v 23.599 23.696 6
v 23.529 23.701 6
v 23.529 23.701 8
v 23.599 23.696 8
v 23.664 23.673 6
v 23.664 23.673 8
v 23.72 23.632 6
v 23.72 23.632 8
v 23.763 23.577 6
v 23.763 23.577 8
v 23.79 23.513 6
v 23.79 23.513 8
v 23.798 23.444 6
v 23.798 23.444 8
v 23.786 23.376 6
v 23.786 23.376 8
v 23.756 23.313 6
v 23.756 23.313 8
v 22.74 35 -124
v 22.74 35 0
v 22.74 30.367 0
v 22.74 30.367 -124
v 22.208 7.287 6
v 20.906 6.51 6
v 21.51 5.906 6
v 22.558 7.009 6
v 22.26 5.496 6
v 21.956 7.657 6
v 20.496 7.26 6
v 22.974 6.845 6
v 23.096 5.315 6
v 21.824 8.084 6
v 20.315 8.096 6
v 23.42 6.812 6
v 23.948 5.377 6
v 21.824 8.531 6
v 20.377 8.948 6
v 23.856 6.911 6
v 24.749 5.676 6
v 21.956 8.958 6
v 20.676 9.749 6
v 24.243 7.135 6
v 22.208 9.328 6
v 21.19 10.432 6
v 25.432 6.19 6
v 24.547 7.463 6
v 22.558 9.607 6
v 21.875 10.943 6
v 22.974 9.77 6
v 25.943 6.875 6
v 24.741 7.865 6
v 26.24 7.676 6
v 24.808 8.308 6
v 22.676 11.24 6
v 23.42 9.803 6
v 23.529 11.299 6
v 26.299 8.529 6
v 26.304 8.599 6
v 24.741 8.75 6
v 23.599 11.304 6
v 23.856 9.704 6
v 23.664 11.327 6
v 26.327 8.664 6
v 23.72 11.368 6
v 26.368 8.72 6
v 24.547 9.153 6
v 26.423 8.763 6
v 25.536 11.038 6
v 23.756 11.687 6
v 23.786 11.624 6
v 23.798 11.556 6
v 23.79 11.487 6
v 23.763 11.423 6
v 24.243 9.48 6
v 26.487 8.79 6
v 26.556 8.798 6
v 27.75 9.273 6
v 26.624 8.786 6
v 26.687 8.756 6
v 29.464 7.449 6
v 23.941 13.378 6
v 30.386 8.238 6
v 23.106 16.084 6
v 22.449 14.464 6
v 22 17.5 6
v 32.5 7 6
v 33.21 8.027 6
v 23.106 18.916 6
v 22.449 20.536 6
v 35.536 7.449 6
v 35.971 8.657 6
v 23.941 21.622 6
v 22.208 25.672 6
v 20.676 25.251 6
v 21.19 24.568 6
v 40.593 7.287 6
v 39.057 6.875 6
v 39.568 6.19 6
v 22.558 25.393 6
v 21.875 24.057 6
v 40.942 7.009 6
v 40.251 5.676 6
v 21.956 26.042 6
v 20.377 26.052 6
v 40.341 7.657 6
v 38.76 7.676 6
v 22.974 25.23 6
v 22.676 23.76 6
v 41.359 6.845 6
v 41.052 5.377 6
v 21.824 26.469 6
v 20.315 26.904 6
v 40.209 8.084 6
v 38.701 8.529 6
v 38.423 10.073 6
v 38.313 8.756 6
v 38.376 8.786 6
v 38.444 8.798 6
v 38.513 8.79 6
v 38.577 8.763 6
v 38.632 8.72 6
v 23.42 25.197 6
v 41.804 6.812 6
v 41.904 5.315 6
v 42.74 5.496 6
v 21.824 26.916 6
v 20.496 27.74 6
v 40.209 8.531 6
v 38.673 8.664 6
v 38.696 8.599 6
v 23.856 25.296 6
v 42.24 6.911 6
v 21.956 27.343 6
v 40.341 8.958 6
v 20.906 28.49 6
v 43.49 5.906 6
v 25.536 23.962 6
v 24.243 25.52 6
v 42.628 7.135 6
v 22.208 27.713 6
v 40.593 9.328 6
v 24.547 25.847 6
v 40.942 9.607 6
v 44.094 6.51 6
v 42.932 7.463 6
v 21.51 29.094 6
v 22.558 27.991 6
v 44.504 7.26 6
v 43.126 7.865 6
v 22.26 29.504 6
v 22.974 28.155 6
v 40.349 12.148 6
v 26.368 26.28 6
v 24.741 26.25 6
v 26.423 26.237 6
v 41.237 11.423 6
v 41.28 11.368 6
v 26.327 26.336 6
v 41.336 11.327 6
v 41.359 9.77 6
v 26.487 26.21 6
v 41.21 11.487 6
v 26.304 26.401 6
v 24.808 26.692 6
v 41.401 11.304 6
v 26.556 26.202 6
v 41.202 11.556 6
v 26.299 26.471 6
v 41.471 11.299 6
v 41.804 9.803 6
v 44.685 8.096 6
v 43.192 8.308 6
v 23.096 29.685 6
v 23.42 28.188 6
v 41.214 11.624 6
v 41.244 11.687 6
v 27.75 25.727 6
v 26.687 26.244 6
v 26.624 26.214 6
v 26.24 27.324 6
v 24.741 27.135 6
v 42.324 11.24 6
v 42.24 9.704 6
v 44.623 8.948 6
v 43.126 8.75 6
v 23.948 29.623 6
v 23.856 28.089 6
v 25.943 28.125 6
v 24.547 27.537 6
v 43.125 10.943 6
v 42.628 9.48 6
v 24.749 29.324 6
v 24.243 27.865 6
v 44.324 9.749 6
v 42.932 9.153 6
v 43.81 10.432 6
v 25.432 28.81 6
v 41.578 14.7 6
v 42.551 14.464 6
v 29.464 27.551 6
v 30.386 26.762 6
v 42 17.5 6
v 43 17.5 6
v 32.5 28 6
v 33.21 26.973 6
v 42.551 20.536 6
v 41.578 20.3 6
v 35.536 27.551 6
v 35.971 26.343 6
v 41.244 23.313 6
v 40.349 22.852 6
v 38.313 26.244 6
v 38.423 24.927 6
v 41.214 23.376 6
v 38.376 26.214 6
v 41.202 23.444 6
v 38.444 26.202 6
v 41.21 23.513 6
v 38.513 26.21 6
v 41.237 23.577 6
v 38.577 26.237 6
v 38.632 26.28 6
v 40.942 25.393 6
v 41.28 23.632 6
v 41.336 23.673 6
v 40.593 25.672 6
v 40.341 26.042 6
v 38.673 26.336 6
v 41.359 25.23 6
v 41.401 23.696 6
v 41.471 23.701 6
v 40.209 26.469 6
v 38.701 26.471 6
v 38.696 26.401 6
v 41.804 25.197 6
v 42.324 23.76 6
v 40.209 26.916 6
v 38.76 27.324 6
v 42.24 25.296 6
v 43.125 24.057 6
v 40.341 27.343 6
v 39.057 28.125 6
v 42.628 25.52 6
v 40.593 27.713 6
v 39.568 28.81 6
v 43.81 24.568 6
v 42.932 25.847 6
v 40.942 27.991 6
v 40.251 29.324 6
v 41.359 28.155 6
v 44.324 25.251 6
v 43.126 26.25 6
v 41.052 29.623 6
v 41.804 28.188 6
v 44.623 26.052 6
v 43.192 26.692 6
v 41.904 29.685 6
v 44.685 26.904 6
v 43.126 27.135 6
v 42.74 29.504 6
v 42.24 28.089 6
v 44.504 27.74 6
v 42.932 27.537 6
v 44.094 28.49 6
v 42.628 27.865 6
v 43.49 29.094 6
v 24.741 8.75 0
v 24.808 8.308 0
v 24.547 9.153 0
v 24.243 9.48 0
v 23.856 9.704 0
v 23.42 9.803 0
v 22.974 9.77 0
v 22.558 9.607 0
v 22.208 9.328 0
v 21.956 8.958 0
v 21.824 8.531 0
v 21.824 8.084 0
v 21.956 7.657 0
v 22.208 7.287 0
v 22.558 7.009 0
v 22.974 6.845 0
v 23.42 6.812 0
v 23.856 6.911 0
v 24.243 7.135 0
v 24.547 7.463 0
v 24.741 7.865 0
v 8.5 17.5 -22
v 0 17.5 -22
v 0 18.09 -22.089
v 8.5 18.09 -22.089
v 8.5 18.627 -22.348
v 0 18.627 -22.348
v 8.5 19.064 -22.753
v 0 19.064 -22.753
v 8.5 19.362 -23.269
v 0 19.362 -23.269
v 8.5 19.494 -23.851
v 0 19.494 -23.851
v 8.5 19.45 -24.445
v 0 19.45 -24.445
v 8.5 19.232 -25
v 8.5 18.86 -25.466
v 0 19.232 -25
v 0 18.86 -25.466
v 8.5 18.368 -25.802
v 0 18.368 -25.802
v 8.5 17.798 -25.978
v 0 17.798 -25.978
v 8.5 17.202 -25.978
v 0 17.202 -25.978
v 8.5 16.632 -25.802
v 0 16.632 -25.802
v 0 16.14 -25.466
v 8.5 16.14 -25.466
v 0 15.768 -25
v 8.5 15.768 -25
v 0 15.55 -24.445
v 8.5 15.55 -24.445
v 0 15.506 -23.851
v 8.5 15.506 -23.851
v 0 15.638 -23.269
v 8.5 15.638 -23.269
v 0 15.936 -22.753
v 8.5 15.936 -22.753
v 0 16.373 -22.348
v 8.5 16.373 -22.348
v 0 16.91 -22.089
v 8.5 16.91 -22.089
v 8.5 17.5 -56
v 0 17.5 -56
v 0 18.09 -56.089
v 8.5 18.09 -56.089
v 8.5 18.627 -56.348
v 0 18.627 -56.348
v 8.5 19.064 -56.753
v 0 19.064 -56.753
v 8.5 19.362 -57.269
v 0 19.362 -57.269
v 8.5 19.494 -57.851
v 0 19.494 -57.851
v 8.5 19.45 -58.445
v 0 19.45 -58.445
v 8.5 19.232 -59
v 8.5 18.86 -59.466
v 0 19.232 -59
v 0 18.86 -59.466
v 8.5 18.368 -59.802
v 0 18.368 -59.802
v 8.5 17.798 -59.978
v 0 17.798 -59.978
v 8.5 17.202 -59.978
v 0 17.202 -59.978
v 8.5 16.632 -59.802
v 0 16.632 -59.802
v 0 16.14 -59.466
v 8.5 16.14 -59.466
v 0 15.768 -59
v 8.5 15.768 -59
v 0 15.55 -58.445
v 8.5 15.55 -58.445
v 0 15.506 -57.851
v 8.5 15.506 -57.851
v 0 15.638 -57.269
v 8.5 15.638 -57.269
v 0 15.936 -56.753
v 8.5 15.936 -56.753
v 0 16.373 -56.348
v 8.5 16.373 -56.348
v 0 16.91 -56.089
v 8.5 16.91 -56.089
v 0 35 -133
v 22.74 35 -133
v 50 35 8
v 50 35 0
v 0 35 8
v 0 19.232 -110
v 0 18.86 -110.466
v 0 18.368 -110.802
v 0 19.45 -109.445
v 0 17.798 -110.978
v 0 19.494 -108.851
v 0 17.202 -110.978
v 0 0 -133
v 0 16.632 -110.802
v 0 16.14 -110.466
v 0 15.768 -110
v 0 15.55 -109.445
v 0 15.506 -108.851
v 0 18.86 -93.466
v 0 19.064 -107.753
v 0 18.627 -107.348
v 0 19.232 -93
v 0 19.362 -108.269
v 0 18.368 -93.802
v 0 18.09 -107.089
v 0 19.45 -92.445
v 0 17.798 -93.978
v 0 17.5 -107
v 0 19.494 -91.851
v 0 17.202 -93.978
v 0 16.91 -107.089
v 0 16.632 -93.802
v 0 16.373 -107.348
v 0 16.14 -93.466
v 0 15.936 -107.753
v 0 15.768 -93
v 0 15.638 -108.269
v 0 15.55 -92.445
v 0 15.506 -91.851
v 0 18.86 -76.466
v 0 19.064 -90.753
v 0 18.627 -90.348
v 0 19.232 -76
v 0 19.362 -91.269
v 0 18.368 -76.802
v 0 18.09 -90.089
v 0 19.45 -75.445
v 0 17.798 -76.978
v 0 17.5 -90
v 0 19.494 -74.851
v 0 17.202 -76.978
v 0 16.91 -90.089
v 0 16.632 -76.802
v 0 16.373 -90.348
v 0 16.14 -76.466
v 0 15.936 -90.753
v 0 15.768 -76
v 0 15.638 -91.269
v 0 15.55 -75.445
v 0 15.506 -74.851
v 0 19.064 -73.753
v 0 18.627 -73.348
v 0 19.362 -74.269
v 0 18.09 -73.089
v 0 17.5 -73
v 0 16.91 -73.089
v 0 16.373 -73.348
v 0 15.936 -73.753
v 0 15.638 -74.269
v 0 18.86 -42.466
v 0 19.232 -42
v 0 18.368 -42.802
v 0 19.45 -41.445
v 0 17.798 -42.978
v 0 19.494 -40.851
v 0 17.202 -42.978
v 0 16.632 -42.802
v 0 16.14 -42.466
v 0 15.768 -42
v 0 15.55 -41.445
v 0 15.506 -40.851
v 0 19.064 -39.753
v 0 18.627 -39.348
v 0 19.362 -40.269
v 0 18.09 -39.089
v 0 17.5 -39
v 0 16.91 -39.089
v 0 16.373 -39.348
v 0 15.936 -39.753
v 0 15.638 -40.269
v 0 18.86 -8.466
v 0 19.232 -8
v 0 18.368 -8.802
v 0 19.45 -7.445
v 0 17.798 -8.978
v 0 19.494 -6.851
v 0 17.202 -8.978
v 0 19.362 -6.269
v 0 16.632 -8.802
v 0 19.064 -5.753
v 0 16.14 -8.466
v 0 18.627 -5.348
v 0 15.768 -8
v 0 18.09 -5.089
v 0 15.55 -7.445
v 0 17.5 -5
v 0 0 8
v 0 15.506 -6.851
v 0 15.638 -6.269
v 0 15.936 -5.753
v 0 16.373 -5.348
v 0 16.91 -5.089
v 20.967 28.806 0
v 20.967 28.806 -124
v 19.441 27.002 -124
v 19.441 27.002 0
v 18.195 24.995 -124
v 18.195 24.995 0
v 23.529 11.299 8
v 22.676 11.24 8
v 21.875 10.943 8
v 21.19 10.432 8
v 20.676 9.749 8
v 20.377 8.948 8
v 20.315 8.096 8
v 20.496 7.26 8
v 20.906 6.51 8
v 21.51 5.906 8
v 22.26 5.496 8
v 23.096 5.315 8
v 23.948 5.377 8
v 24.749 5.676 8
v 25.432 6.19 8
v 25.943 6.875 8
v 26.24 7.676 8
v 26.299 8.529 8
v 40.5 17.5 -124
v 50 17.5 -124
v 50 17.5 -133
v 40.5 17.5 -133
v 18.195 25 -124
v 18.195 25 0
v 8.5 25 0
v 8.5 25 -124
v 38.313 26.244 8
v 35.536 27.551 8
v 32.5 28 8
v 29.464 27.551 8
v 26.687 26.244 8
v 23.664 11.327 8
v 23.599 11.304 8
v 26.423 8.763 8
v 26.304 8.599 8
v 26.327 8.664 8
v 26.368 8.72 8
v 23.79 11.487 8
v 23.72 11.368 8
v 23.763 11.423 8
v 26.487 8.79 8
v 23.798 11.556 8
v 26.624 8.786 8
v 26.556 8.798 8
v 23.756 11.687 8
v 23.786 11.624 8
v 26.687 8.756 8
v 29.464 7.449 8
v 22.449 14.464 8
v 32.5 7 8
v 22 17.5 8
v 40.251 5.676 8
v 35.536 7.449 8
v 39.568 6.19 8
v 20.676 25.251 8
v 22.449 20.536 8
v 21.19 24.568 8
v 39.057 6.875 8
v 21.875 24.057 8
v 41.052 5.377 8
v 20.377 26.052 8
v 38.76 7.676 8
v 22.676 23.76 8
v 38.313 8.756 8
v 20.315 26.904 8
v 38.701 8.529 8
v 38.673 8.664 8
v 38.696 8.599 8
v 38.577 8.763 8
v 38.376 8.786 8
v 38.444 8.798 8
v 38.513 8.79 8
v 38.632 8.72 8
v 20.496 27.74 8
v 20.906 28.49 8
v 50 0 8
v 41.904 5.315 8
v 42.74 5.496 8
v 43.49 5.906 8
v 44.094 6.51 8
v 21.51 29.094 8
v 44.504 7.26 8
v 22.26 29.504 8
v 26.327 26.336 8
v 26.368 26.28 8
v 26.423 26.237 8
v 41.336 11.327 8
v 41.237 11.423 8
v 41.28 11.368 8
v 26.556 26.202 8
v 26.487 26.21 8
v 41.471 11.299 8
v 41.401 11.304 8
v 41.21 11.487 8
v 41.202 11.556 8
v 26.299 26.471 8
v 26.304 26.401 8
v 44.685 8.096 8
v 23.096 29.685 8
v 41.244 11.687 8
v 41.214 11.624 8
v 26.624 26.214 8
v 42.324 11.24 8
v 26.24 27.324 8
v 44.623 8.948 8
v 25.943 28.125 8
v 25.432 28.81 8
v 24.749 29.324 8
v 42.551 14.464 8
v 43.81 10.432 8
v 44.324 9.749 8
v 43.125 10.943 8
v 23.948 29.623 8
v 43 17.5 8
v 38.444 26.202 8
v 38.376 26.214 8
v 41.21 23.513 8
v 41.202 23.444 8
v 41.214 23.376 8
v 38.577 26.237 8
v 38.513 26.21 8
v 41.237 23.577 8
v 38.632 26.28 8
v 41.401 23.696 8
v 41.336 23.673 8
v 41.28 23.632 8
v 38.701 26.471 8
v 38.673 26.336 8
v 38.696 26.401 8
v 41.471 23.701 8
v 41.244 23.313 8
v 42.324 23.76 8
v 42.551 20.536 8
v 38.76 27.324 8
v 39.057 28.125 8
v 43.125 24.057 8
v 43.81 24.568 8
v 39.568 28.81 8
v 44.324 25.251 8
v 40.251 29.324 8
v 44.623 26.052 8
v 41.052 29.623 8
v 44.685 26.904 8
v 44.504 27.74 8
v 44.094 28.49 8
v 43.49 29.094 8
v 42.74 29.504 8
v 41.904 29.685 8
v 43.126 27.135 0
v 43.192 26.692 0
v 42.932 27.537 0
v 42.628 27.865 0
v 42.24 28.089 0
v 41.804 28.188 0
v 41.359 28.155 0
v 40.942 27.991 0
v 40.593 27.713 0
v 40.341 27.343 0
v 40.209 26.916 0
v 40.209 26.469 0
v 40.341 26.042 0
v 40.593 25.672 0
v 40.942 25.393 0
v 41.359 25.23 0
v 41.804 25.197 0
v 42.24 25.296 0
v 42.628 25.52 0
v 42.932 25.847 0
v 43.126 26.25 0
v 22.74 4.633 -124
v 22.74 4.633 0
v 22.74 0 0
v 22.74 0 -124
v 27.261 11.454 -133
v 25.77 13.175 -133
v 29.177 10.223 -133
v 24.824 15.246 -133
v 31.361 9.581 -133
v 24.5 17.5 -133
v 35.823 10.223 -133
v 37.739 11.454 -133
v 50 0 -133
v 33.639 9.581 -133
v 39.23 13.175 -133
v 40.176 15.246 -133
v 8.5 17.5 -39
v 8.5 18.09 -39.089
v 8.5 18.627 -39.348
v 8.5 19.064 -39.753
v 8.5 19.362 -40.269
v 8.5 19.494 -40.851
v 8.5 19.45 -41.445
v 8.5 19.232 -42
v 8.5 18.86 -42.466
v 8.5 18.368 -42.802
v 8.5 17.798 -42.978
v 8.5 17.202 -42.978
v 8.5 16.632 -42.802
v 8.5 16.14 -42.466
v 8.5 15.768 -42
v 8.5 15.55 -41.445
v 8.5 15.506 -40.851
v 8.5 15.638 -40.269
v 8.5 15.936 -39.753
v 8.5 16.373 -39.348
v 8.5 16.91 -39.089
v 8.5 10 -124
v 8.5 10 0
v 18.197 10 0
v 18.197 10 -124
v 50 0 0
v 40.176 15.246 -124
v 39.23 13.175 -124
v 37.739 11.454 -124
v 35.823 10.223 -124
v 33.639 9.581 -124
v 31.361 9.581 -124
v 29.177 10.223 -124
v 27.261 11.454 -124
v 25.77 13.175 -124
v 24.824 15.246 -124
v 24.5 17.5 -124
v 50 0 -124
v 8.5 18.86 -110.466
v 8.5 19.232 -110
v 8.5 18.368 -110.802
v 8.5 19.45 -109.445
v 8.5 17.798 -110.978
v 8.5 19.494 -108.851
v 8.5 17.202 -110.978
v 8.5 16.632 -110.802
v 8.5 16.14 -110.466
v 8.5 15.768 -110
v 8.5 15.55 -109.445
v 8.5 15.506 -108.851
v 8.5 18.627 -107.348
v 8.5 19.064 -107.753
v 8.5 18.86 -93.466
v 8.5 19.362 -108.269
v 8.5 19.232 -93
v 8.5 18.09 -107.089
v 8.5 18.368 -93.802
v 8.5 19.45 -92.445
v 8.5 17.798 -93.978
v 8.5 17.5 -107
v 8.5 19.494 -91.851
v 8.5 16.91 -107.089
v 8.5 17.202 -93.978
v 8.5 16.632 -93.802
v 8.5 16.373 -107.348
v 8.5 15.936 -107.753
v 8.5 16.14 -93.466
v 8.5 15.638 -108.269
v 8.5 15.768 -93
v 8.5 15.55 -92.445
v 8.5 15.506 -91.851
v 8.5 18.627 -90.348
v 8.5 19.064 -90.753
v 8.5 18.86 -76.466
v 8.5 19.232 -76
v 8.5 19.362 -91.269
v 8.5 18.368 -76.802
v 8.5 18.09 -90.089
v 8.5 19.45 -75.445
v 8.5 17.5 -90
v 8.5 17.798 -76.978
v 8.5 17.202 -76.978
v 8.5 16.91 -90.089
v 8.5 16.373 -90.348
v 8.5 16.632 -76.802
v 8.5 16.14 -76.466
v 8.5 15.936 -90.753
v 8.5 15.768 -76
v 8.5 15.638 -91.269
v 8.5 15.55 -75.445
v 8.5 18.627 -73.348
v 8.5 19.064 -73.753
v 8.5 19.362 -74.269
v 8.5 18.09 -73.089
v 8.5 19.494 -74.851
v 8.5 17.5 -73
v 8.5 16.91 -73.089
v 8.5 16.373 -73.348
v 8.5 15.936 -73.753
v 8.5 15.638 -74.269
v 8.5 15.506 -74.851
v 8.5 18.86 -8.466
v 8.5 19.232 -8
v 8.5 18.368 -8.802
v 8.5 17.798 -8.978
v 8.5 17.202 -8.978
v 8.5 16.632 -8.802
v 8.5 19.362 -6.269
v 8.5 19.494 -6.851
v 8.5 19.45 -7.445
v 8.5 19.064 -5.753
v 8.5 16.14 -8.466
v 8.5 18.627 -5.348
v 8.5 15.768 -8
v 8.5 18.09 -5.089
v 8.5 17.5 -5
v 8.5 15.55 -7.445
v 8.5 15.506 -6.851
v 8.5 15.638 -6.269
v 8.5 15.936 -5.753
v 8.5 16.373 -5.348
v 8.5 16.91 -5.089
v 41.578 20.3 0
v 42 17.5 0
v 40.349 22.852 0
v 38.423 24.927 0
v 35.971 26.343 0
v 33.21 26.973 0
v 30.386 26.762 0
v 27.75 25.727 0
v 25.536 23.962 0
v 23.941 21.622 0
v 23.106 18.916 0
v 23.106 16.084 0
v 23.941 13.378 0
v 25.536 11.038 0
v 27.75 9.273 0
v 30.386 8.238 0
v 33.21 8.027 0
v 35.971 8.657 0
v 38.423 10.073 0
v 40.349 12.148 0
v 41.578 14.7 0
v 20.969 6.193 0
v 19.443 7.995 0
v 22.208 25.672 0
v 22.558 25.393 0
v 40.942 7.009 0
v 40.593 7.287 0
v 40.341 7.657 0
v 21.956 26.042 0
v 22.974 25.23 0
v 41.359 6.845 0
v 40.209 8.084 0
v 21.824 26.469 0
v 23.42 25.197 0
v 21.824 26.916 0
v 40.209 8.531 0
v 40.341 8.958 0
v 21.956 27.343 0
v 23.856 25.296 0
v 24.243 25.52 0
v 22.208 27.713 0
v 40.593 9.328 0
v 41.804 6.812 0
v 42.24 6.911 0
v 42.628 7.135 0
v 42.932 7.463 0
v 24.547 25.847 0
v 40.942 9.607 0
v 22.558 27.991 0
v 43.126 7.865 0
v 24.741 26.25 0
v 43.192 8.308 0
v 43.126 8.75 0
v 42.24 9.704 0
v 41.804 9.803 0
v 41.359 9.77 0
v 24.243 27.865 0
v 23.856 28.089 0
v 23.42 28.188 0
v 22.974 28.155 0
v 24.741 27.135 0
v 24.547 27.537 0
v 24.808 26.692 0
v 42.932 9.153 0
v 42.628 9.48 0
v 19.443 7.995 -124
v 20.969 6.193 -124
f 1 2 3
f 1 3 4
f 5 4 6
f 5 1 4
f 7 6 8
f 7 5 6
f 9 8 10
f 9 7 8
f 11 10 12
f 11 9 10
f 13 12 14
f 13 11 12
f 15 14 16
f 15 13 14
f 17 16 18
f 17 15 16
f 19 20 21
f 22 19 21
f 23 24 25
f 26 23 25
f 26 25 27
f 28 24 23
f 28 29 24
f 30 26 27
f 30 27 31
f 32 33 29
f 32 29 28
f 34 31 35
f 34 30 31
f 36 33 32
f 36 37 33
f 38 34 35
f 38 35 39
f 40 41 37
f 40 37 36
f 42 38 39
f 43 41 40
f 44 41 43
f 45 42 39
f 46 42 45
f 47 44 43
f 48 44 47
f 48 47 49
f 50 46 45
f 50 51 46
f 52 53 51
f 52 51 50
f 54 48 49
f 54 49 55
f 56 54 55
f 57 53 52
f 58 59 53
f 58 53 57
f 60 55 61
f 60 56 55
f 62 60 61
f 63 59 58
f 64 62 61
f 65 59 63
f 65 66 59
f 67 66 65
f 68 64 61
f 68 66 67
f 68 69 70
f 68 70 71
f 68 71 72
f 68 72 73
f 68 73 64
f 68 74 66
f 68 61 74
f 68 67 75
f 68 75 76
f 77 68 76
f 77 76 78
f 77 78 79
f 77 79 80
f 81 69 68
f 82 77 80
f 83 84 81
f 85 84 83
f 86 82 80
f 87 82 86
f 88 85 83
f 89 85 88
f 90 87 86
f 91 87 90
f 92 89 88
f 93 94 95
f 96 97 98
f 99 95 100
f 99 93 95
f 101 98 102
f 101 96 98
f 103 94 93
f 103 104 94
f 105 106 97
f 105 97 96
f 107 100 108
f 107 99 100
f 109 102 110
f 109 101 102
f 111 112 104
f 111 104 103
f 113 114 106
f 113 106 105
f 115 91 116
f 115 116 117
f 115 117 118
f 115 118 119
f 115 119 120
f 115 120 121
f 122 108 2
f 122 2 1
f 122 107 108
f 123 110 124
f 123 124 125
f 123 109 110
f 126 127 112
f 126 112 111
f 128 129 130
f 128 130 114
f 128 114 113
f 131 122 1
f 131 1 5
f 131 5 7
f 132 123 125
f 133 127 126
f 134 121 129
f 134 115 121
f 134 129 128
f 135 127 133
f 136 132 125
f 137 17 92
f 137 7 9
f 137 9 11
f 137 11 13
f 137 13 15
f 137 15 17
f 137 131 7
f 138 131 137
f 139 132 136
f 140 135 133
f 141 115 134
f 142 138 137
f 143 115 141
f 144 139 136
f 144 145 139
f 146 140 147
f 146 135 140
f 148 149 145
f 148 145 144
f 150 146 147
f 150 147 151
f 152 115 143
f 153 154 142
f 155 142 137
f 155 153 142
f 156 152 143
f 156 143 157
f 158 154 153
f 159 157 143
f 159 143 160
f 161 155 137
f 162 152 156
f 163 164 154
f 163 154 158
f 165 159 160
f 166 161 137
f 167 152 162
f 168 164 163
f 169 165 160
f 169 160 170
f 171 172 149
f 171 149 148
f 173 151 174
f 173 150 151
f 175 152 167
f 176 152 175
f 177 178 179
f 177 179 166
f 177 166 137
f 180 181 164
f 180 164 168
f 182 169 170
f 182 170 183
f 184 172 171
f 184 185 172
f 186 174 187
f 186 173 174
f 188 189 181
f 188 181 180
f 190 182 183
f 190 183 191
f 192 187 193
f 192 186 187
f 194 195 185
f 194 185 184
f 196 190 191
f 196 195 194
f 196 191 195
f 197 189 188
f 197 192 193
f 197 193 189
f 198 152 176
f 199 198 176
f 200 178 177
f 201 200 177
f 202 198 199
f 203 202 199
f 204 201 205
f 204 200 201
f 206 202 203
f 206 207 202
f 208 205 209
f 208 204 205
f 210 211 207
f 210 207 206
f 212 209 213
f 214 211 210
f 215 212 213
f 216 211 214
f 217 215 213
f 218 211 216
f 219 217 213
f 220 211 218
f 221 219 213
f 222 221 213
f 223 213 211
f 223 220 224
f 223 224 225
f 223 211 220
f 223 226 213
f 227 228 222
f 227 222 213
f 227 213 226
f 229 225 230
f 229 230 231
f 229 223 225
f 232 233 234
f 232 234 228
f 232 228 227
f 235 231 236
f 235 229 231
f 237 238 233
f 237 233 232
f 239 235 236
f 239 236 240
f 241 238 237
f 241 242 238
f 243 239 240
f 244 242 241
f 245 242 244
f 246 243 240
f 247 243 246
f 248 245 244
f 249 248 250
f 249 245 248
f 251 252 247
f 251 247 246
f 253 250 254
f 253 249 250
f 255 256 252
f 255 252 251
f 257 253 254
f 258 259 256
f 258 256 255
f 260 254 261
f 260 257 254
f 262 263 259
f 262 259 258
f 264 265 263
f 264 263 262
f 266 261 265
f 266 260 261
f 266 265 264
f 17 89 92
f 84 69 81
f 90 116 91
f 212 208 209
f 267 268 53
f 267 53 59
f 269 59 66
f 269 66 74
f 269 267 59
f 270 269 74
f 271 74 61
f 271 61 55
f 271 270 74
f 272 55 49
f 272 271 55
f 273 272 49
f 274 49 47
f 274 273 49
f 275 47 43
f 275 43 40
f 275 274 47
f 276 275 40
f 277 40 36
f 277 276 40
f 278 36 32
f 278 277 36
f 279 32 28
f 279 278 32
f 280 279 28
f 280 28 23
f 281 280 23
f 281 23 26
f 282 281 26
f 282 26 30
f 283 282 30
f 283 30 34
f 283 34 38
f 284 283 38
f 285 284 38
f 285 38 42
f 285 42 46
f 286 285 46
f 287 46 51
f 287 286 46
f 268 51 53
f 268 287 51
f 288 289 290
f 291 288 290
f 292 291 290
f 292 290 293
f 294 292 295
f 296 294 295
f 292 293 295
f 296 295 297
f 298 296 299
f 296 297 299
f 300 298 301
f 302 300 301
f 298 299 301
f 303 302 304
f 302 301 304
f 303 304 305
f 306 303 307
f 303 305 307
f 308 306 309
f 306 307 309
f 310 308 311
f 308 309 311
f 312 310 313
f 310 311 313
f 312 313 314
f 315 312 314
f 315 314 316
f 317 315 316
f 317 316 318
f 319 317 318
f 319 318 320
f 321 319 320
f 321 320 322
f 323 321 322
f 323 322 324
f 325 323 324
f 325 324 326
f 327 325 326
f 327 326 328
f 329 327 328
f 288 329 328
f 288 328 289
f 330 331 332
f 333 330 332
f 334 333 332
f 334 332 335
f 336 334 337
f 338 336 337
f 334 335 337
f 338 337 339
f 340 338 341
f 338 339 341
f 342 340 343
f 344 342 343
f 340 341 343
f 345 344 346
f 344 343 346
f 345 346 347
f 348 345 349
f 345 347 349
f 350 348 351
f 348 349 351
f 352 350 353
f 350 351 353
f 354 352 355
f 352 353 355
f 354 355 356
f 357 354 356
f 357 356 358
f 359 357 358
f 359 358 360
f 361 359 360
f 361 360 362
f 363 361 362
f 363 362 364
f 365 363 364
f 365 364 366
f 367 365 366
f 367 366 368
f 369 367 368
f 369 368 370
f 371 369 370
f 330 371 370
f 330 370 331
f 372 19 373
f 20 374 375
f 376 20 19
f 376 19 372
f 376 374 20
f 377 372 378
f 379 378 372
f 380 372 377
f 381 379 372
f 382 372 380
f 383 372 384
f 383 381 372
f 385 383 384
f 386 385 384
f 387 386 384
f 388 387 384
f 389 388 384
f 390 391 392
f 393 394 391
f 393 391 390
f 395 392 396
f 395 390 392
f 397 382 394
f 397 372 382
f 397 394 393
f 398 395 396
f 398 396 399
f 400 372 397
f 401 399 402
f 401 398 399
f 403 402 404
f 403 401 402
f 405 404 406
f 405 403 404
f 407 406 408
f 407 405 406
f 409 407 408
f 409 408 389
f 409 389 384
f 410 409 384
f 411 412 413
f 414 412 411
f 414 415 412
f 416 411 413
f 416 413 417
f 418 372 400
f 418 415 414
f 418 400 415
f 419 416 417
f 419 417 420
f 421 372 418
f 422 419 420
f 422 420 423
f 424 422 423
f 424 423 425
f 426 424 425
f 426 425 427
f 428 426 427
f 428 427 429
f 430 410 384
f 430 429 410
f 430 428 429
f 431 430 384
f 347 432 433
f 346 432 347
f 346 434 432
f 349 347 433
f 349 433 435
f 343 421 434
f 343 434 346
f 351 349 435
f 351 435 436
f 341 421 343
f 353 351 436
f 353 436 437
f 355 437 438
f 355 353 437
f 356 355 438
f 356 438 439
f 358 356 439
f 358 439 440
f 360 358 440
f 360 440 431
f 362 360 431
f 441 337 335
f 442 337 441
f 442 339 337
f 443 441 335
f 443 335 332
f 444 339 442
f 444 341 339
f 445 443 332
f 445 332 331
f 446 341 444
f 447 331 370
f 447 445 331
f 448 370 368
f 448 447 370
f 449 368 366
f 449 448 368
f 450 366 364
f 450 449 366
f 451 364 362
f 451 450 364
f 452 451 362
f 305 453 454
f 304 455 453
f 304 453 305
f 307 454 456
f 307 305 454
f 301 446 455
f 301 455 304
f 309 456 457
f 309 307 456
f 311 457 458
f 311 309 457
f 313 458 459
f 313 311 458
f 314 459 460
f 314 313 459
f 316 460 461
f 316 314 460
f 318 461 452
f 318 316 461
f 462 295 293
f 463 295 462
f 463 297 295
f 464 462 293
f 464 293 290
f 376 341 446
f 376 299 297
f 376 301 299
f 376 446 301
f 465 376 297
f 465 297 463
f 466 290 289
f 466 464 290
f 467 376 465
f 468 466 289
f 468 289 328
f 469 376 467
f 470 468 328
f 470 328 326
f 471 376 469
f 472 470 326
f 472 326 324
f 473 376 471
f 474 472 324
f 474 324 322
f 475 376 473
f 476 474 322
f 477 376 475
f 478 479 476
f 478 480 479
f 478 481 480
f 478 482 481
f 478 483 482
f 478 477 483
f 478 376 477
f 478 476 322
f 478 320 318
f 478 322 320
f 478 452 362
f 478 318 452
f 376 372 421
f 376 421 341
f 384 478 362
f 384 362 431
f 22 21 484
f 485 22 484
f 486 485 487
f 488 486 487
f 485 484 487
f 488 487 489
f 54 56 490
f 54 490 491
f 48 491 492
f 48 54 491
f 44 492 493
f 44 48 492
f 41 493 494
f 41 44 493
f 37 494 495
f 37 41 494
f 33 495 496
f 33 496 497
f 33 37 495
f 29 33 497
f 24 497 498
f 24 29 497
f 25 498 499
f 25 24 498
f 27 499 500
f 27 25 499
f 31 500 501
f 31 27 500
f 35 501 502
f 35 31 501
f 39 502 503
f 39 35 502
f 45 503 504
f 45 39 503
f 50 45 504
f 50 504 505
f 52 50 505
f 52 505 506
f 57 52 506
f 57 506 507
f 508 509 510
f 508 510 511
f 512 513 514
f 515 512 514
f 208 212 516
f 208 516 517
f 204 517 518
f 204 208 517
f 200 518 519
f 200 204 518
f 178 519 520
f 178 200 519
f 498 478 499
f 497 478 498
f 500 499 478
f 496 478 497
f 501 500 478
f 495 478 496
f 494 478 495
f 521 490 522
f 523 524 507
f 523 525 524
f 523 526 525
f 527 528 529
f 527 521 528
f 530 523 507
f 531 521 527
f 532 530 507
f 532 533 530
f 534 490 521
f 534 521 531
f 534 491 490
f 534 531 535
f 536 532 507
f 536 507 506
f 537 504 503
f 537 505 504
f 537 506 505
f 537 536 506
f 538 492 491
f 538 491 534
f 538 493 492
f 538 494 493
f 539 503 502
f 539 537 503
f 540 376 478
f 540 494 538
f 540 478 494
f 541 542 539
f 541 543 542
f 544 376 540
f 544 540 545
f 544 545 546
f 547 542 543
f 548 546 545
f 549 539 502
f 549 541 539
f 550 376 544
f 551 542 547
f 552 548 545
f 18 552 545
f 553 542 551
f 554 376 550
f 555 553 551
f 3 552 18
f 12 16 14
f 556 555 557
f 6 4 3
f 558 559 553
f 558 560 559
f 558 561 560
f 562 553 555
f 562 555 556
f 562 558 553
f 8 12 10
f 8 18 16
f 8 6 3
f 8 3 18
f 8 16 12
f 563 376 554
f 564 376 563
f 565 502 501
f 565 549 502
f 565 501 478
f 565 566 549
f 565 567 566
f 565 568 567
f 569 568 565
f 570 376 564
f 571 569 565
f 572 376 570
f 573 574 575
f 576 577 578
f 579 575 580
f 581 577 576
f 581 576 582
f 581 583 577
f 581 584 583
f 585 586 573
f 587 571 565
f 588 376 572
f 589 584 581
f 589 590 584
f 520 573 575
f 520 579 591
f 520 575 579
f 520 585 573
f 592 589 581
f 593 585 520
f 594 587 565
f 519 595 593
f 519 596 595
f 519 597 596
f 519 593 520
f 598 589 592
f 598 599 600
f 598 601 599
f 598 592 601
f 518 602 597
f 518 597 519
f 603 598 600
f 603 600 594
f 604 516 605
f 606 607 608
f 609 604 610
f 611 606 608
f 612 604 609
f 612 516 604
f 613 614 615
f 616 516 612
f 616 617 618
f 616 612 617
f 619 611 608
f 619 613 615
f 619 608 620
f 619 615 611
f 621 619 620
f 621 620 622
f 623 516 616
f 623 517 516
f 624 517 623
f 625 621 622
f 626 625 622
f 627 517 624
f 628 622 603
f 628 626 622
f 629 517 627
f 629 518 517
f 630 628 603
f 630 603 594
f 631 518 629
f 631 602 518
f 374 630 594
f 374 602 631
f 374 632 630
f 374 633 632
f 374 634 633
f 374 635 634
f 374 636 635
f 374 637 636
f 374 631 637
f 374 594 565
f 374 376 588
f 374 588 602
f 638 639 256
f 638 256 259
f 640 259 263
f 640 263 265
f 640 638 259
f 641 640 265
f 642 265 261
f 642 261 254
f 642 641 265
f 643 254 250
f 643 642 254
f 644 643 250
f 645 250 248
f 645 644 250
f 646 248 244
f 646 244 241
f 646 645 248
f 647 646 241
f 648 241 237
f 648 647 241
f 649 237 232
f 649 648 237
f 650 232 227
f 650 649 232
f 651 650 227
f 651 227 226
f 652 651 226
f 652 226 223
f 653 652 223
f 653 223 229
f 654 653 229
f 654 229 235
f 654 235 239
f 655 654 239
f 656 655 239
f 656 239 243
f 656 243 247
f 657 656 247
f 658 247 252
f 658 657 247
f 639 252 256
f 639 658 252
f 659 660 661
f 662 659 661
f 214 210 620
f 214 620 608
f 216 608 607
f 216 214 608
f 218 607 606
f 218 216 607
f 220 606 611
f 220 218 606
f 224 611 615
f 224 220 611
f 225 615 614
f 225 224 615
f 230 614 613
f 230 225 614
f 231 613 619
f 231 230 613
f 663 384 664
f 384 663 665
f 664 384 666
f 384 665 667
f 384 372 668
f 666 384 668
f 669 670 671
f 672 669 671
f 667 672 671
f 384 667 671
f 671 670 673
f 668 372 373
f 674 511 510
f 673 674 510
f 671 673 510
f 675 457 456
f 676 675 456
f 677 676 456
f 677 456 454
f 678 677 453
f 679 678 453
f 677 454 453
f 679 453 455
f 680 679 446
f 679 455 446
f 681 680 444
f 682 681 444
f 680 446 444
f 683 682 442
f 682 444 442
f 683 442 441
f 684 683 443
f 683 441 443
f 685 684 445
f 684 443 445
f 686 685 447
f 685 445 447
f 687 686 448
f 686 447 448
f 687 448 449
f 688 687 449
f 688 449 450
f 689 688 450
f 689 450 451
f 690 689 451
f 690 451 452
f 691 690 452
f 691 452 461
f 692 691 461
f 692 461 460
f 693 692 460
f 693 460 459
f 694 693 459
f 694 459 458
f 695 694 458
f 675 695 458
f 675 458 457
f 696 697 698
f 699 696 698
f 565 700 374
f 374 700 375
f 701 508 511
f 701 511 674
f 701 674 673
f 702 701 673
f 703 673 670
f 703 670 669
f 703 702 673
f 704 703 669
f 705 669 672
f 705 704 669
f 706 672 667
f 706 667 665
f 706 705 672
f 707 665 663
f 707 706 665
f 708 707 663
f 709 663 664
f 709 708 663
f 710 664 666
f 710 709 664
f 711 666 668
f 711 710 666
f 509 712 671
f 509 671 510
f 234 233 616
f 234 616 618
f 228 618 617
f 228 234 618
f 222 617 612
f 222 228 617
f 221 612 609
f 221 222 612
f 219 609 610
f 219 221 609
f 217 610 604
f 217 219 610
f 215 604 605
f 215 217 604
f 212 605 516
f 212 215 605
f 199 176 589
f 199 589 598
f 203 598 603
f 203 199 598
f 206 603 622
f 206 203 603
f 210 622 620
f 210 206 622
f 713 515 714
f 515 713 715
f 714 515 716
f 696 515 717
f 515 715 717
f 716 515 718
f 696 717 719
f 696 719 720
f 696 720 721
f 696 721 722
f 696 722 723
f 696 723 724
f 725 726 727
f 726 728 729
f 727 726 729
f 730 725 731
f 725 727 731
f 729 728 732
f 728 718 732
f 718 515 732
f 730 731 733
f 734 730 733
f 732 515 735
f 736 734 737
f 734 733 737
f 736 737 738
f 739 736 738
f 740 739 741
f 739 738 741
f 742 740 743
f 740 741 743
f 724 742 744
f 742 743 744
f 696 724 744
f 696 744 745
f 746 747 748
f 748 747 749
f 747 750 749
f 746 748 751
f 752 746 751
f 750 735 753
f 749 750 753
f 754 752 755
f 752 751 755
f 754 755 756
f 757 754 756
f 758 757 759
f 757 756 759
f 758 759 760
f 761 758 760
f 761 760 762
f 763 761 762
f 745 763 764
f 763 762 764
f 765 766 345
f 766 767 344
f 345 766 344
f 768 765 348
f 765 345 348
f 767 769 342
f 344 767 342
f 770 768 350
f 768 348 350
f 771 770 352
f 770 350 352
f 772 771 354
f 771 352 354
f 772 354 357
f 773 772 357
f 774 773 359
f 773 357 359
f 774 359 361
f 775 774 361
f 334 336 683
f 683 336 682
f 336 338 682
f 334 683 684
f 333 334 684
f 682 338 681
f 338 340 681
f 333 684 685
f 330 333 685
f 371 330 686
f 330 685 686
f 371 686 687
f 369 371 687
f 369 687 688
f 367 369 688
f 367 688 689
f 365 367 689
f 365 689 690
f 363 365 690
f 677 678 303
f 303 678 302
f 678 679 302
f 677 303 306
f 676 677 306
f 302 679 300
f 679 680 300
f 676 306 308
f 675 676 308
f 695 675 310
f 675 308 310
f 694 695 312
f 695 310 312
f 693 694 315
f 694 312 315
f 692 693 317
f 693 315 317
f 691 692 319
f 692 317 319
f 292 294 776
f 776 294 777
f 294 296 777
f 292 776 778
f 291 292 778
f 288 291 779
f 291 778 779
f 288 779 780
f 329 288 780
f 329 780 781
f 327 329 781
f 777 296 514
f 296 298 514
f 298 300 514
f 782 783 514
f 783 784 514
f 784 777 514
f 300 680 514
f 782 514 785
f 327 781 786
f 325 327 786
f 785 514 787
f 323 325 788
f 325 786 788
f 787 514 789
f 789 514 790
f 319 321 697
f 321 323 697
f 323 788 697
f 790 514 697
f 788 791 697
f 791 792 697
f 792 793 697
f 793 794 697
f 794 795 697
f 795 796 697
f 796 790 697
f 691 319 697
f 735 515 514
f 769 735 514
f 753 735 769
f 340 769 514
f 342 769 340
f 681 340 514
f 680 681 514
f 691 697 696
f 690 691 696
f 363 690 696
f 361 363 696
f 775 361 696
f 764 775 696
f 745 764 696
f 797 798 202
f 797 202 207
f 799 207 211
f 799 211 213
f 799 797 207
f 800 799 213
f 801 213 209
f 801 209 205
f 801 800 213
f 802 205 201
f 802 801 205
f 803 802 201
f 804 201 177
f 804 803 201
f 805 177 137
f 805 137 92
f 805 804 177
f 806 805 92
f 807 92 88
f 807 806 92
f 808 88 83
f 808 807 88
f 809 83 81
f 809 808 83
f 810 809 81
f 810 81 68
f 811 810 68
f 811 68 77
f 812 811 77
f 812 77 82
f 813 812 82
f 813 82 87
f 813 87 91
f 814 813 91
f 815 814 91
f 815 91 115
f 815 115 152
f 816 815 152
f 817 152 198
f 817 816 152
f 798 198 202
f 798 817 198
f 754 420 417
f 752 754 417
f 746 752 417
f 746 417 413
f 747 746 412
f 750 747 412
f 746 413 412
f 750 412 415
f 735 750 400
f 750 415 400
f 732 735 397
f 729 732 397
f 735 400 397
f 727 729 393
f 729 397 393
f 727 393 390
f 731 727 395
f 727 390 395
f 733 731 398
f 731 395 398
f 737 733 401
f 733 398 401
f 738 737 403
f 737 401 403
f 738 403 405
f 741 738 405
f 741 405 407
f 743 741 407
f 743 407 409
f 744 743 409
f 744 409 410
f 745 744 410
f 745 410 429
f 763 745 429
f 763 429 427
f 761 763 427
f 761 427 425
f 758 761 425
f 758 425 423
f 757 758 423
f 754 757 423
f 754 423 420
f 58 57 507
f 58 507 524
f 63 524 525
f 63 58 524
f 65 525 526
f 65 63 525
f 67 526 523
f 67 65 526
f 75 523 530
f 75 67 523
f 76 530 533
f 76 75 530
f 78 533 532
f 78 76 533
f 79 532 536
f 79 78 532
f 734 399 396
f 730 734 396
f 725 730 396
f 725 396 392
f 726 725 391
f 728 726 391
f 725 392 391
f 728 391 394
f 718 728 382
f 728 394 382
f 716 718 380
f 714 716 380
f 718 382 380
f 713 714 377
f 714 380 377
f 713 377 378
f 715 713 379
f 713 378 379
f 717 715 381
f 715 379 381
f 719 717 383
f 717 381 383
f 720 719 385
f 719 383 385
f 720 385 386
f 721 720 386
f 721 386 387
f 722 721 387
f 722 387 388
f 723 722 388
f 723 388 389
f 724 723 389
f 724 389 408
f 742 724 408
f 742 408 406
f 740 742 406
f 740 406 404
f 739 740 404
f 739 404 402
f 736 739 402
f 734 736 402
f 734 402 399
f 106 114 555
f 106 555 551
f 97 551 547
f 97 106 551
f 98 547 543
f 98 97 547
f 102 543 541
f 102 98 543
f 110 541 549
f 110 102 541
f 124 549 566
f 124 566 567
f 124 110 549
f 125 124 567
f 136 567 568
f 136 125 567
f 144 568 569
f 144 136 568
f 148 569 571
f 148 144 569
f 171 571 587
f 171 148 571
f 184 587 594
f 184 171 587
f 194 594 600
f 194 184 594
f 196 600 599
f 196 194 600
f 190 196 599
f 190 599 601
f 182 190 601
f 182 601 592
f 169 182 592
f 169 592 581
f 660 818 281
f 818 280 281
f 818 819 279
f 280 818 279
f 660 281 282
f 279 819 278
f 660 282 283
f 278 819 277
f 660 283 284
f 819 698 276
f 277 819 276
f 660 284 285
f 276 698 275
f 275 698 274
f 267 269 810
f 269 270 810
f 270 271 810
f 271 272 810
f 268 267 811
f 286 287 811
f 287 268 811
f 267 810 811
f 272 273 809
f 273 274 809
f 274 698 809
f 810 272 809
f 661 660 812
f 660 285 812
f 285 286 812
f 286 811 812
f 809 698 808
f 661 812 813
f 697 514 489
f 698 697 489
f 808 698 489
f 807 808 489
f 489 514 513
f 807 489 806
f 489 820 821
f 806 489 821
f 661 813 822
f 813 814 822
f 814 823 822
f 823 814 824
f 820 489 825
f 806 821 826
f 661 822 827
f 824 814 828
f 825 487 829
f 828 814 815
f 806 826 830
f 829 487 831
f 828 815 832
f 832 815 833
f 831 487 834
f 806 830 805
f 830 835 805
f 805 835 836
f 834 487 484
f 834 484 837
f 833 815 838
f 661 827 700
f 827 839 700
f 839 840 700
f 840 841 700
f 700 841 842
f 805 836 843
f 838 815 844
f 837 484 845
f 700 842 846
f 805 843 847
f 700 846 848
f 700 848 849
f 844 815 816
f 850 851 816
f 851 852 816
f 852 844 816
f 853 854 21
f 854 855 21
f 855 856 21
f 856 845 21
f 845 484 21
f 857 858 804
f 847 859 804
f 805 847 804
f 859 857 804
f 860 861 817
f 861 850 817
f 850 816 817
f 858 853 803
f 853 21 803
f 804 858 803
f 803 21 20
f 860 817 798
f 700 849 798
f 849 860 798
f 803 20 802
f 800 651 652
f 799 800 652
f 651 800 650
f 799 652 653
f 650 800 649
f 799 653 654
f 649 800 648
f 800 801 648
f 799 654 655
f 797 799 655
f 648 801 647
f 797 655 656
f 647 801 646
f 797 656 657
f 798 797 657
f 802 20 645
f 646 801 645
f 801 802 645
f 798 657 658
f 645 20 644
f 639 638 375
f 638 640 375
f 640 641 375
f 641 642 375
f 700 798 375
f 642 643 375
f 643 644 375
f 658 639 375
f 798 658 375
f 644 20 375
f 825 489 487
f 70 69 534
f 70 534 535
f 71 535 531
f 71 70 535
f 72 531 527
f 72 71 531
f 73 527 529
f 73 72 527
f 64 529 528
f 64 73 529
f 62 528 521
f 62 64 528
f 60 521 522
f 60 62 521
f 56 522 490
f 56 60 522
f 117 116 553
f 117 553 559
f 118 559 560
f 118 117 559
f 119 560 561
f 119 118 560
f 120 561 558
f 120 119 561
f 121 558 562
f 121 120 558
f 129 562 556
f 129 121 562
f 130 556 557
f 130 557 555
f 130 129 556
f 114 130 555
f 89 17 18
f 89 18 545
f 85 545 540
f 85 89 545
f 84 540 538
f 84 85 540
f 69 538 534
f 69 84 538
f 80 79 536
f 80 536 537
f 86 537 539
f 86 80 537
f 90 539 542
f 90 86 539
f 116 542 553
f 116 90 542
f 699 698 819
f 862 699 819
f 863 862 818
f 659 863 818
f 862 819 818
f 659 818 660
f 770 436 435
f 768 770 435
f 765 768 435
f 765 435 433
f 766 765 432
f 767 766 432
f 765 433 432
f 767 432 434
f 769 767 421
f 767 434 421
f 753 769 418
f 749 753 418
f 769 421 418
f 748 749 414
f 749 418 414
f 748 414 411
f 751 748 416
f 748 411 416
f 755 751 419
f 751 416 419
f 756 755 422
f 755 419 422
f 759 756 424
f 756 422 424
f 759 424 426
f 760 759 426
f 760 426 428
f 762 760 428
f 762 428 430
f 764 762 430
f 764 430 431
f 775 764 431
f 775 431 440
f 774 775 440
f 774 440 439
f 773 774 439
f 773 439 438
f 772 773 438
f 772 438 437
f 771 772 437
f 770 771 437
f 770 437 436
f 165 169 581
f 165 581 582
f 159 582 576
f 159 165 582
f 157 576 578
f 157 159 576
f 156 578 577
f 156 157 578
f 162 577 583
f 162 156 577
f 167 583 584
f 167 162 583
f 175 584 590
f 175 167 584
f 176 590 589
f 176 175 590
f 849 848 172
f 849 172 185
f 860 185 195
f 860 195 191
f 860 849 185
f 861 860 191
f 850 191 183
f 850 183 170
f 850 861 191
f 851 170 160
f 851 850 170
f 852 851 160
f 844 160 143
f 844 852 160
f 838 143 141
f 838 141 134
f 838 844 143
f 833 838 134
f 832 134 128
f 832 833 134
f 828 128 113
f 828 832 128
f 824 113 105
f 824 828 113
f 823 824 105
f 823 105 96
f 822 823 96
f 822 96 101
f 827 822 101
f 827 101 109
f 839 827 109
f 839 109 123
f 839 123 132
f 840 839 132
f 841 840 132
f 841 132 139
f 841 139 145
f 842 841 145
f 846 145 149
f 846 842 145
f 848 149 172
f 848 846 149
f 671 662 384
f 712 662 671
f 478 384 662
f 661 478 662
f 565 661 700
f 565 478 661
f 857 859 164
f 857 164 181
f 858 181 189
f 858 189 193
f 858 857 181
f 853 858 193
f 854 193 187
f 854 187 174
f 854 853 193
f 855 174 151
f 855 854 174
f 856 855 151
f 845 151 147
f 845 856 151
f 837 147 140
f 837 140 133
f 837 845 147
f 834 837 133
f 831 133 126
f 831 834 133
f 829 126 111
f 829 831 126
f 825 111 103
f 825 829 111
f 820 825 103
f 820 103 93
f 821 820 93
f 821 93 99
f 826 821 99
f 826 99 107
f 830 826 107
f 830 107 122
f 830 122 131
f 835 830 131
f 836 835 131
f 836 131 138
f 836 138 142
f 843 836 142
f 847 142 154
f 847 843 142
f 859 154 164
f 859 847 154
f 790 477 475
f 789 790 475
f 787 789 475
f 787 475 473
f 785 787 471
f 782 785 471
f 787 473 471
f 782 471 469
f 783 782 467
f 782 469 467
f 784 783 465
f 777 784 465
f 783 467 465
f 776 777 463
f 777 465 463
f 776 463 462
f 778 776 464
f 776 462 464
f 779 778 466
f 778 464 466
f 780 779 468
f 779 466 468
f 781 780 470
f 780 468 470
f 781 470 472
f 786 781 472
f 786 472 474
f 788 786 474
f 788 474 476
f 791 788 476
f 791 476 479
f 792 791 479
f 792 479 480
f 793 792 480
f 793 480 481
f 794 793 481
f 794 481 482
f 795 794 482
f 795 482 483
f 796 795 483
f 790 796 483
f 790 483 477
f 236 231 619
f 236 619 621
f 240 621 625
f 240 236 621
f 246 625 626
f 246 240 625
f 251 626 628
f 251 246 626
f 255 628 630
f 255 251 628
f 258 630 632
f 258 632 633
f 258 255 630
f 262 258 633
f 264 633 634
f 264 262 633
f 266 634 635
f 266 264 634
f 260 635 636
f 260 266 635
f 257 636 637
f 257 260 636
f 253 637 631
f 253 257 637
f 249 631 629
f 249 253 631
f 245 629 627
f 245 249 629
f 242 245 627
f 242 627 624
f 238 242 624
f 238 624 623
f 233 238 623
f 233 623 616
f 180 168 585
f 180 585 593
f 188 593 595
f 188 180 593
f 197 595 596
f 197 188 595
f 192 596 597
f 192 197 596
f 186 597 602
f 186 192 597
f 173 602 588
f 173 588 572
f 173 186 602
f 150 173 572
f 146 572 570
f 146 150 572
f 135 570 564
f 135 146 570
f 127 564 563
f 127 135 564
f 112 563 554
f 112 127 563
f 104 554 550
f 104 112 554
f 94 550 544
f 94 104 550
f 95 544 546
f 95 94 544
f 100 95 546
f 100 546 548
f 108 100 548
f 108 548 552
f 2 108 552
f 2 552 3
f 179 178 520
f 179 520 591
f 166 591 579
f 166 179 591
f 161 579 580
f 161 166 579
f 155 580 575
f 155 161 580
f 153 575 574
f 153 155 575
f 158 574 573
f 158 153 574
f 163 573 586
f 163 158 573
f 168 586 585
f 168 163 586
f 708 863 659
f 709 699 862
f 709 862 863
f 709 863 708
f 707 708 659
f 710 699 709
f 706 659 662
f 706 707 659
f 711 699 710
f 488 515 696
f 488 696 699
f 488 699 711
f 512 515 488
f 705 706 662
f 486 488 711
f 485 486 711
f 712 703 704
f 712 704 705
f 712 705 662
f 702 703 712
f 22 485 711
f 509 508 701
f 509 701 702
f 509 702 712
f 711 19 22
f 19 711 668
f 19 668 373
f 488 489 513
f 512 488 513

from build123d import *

# Parameters (mm, degrees)
SKETCH1_W           = 50
SKETCH1_H           = 35
SKETCH1_R           = 9.5
SKETCH1_R_2         = 1.5
BOSS_EXTRUDE3_DEPTH = 6
SKETCH4_W           = 50
SKETCH4_H           = 35
BOSS_EXTRUDE5_DEPTH = 2
BOSS_EXTRUDE6_DEPTH = 124
SKETCH9_R           = 2
CUT_EXTRUDE1_DEPTH  = 115
BOSS_EXTRUDE7_DEPTH = 9


with BuildPart() as part:
    # Sketch1 → Boss-Extrude3 (new body)
    with BuildSketch(Plane.XY):
        with Locations((25, 17.5)):
            Rectangle(SKETCH1_W, SKETCH1_H)
        with Locations((32.5, 17.5)):
            Circle(SKETCH1_R, mode=Mode.SUBTRACT)
        with Locations((41.692388155, 26.692388155)):
            Circle(SKETCH1_R_2, mode=Mode.SUBTRACT)
        with Locations((41.692388155, 8.307611845)):
            Circle(SKETCH1_R_2, mode=Mode.SUBTRACT)
        with Locations((23.307611845, 8.307611845)):
            Circle(SKETCH1_R_2, mode=Mode.SUBTRACT)
        with Locations((23.307611845, 26.692388155)):
            Circle(SKETCH1_R_2, mode=Mode.SUBTRACT)
    extrude(amount=BOSS_EXTRUDE3_DEPTH)

    # Sketch4 → Boss-Extrude5 (add)
    with BuildSketch(Plane.XY.offset(6)):
        with Locations((25, 17.5)):
            Rectangle(SKETCH4_W, SKETCH4_H)
        with BuildLine():
            ThreePointArc((26.299419693, 26.47083501), (21.186291501, 28.813708499), (23.52916499, 23.700580307))
            ThreePointArc((23.52916499, 23.700580307), (23.763454109, 23.57743344), (23.755822455, 23.312861521))
            ThreePointArc((23.755822455, 23.312861521), (22, 17.5), (23.755822455, 11.687138479))
            ThreePointArc((23.755822455, 11.687138479), (23.763454109, 11.42256656), (23.52916499, 11.299419693))
            ThreePointArc((23.52916499, 11.299419693), (21.186291501, 6.186291501), (26.299419693, 8.52916499))
            ThreePointArc((26.299419693, 8.52916499), (26.42256656, 8.763454109), (26.687138479, 8.755822455))
            ThreePointArc((26.687138479, 8.755822455), (32.5, 7), (38.312861521, 8.755822455))
            ThreePointArc((38.312861521, 8.755822455), (38.57743344, 8.763454109), (38.700580307, 8.52916499))
            ThreePointArc((38.700580307, 8.52916499), (43.813708499, 6.186291501), (41.47083501, 11.299419693))
            ThreePointArc((41.47083501, 11.299419693), (41.236545891, 11.42256656), (41.244177545, 11.687138479))
            ThreePointArc((41.244177545, 11.687138479), (43, 17.5), (41.244177545, 23.312861521))
            ThreePointArc((41.244177545, 23.312861521), (41.236545891, 23.57743344), (41.47083501, 23.700580307))
            ThreePointArc((41.47083501, 23.700580307), (43.813708499, 28.813708499), (38.700580307, 26.47083501))
            ThreePointArc((38.700580307, 26.47083501), (38.57743344, 26.236545891), (38.312861521, 26.244177545))
            ThreePointArc((38.312861521, 26.244177545), (32.5, 28), (26.687138479, 26.244177545))
            ThreePointArc((26.687138479, 26.244177545), (26.42256656, 26.236545891), (26.299419693, 26.47083501))
        make_face(mode=Mode.SUBTRACT)
    extrude(amount=BOSS_EXTRUDE5_DEPTH)

    # Sketch8 → Boss-Extrude6 (add)
    with BuildSketch(Plane(origin=(0, 0, 0), x_dir=(-1, 0, 0), z_dir=(0, 0, -1))):
        with BuildLine():
            Line((-8.5, 35), (-22.740329685, 35))
            Line((-22.740329685, 35), (-22.740329685, 30.367452558))
            ThreePointArc((-22.740329685, 30.367452558), (-20.171344576, 27.9320063), (-18.194683381, 24.99535966))
            Line((-18.194683381, 24.99535966), (-18.194683381, 25))
            Line((-18.194683381, 25), (-8.5, 25))
            Line((-8.5, 25), (-8.5, 10.000000197))
            Line((-8.5, 10.000000197), (-18.197115572, 10.000000197))
            ThreePointArc((-18.197115572, 10.000000197), (-20.17303677, 7.065994176), (-22.740329685, 4.632547442))
            Line((-22.740329685, 4.632547442), (-22.740329685, 0))
            Line((-22.740329685, 0), (-8.5, 0))
            Line((-8.5, 0), (0, 0))
            Line((0, 0), (0, 10.000000197))
            Line((0, 10.000000197), (0, 25))
            Line((0, 25), (0, 35))
            Line((0, 35), (-8.5, 35))
        make_face()
    extrude(amount=BOSS_EXTRUDE6_DEPTH)

    # Sketch9 → Cut-Extrude1 (cut)
    with BuildSketch(Plane.ZY):
        with Locations((-7, 17.5)):
            Circle(SKETCH9_R)
        with Locations((-24, 17.5)):
            Circle(SKETCH9_R)
        with Locations((-41, 17.5)):
            Circle(SKETCH9_R)
        with Locations((-58, 17.5)):
            Circle(SKETCH9_R)
        with Locations((-75, 17.5)):
            Circle(SKETCH9_R)
        with Locations((-92, 17.5)):
            Circle(SKETCH9_R)
        with Locations((-109, 17.5)):
            Circle(SKETCH9_R)
    extrude(amount=-CUT_EXTRUDE1_DEPTH, mode=Mode.SUBTRACT)

    # Sketch12 → Boss-Extrude7 (add)
    with BuildSketch(Plane(origin=(0, 0, -124), x_dir=(-1, 0, 0), z_dir=(0, 0, -1))):
        with BuildLine():
            Line((-24.5, 17.5), (-22.740329685, 35))
            Line((-22.740329685, 35), (0, 35))
            Line((0, 35), (0, 0))
            Line((0, 0), (-50, 0))
            Line((-50, 0), (-50, 17.5))
            Line((-50, 17.5), (-40.5, 17.5))
            ThreePointArc((-40.5, 17.5), (-32.5, 9.5), (-24.5, 17.5))
        make_face()
    extrude(amount=BOSS_EXTRUDE7_DEPTH)


solid = part.part
